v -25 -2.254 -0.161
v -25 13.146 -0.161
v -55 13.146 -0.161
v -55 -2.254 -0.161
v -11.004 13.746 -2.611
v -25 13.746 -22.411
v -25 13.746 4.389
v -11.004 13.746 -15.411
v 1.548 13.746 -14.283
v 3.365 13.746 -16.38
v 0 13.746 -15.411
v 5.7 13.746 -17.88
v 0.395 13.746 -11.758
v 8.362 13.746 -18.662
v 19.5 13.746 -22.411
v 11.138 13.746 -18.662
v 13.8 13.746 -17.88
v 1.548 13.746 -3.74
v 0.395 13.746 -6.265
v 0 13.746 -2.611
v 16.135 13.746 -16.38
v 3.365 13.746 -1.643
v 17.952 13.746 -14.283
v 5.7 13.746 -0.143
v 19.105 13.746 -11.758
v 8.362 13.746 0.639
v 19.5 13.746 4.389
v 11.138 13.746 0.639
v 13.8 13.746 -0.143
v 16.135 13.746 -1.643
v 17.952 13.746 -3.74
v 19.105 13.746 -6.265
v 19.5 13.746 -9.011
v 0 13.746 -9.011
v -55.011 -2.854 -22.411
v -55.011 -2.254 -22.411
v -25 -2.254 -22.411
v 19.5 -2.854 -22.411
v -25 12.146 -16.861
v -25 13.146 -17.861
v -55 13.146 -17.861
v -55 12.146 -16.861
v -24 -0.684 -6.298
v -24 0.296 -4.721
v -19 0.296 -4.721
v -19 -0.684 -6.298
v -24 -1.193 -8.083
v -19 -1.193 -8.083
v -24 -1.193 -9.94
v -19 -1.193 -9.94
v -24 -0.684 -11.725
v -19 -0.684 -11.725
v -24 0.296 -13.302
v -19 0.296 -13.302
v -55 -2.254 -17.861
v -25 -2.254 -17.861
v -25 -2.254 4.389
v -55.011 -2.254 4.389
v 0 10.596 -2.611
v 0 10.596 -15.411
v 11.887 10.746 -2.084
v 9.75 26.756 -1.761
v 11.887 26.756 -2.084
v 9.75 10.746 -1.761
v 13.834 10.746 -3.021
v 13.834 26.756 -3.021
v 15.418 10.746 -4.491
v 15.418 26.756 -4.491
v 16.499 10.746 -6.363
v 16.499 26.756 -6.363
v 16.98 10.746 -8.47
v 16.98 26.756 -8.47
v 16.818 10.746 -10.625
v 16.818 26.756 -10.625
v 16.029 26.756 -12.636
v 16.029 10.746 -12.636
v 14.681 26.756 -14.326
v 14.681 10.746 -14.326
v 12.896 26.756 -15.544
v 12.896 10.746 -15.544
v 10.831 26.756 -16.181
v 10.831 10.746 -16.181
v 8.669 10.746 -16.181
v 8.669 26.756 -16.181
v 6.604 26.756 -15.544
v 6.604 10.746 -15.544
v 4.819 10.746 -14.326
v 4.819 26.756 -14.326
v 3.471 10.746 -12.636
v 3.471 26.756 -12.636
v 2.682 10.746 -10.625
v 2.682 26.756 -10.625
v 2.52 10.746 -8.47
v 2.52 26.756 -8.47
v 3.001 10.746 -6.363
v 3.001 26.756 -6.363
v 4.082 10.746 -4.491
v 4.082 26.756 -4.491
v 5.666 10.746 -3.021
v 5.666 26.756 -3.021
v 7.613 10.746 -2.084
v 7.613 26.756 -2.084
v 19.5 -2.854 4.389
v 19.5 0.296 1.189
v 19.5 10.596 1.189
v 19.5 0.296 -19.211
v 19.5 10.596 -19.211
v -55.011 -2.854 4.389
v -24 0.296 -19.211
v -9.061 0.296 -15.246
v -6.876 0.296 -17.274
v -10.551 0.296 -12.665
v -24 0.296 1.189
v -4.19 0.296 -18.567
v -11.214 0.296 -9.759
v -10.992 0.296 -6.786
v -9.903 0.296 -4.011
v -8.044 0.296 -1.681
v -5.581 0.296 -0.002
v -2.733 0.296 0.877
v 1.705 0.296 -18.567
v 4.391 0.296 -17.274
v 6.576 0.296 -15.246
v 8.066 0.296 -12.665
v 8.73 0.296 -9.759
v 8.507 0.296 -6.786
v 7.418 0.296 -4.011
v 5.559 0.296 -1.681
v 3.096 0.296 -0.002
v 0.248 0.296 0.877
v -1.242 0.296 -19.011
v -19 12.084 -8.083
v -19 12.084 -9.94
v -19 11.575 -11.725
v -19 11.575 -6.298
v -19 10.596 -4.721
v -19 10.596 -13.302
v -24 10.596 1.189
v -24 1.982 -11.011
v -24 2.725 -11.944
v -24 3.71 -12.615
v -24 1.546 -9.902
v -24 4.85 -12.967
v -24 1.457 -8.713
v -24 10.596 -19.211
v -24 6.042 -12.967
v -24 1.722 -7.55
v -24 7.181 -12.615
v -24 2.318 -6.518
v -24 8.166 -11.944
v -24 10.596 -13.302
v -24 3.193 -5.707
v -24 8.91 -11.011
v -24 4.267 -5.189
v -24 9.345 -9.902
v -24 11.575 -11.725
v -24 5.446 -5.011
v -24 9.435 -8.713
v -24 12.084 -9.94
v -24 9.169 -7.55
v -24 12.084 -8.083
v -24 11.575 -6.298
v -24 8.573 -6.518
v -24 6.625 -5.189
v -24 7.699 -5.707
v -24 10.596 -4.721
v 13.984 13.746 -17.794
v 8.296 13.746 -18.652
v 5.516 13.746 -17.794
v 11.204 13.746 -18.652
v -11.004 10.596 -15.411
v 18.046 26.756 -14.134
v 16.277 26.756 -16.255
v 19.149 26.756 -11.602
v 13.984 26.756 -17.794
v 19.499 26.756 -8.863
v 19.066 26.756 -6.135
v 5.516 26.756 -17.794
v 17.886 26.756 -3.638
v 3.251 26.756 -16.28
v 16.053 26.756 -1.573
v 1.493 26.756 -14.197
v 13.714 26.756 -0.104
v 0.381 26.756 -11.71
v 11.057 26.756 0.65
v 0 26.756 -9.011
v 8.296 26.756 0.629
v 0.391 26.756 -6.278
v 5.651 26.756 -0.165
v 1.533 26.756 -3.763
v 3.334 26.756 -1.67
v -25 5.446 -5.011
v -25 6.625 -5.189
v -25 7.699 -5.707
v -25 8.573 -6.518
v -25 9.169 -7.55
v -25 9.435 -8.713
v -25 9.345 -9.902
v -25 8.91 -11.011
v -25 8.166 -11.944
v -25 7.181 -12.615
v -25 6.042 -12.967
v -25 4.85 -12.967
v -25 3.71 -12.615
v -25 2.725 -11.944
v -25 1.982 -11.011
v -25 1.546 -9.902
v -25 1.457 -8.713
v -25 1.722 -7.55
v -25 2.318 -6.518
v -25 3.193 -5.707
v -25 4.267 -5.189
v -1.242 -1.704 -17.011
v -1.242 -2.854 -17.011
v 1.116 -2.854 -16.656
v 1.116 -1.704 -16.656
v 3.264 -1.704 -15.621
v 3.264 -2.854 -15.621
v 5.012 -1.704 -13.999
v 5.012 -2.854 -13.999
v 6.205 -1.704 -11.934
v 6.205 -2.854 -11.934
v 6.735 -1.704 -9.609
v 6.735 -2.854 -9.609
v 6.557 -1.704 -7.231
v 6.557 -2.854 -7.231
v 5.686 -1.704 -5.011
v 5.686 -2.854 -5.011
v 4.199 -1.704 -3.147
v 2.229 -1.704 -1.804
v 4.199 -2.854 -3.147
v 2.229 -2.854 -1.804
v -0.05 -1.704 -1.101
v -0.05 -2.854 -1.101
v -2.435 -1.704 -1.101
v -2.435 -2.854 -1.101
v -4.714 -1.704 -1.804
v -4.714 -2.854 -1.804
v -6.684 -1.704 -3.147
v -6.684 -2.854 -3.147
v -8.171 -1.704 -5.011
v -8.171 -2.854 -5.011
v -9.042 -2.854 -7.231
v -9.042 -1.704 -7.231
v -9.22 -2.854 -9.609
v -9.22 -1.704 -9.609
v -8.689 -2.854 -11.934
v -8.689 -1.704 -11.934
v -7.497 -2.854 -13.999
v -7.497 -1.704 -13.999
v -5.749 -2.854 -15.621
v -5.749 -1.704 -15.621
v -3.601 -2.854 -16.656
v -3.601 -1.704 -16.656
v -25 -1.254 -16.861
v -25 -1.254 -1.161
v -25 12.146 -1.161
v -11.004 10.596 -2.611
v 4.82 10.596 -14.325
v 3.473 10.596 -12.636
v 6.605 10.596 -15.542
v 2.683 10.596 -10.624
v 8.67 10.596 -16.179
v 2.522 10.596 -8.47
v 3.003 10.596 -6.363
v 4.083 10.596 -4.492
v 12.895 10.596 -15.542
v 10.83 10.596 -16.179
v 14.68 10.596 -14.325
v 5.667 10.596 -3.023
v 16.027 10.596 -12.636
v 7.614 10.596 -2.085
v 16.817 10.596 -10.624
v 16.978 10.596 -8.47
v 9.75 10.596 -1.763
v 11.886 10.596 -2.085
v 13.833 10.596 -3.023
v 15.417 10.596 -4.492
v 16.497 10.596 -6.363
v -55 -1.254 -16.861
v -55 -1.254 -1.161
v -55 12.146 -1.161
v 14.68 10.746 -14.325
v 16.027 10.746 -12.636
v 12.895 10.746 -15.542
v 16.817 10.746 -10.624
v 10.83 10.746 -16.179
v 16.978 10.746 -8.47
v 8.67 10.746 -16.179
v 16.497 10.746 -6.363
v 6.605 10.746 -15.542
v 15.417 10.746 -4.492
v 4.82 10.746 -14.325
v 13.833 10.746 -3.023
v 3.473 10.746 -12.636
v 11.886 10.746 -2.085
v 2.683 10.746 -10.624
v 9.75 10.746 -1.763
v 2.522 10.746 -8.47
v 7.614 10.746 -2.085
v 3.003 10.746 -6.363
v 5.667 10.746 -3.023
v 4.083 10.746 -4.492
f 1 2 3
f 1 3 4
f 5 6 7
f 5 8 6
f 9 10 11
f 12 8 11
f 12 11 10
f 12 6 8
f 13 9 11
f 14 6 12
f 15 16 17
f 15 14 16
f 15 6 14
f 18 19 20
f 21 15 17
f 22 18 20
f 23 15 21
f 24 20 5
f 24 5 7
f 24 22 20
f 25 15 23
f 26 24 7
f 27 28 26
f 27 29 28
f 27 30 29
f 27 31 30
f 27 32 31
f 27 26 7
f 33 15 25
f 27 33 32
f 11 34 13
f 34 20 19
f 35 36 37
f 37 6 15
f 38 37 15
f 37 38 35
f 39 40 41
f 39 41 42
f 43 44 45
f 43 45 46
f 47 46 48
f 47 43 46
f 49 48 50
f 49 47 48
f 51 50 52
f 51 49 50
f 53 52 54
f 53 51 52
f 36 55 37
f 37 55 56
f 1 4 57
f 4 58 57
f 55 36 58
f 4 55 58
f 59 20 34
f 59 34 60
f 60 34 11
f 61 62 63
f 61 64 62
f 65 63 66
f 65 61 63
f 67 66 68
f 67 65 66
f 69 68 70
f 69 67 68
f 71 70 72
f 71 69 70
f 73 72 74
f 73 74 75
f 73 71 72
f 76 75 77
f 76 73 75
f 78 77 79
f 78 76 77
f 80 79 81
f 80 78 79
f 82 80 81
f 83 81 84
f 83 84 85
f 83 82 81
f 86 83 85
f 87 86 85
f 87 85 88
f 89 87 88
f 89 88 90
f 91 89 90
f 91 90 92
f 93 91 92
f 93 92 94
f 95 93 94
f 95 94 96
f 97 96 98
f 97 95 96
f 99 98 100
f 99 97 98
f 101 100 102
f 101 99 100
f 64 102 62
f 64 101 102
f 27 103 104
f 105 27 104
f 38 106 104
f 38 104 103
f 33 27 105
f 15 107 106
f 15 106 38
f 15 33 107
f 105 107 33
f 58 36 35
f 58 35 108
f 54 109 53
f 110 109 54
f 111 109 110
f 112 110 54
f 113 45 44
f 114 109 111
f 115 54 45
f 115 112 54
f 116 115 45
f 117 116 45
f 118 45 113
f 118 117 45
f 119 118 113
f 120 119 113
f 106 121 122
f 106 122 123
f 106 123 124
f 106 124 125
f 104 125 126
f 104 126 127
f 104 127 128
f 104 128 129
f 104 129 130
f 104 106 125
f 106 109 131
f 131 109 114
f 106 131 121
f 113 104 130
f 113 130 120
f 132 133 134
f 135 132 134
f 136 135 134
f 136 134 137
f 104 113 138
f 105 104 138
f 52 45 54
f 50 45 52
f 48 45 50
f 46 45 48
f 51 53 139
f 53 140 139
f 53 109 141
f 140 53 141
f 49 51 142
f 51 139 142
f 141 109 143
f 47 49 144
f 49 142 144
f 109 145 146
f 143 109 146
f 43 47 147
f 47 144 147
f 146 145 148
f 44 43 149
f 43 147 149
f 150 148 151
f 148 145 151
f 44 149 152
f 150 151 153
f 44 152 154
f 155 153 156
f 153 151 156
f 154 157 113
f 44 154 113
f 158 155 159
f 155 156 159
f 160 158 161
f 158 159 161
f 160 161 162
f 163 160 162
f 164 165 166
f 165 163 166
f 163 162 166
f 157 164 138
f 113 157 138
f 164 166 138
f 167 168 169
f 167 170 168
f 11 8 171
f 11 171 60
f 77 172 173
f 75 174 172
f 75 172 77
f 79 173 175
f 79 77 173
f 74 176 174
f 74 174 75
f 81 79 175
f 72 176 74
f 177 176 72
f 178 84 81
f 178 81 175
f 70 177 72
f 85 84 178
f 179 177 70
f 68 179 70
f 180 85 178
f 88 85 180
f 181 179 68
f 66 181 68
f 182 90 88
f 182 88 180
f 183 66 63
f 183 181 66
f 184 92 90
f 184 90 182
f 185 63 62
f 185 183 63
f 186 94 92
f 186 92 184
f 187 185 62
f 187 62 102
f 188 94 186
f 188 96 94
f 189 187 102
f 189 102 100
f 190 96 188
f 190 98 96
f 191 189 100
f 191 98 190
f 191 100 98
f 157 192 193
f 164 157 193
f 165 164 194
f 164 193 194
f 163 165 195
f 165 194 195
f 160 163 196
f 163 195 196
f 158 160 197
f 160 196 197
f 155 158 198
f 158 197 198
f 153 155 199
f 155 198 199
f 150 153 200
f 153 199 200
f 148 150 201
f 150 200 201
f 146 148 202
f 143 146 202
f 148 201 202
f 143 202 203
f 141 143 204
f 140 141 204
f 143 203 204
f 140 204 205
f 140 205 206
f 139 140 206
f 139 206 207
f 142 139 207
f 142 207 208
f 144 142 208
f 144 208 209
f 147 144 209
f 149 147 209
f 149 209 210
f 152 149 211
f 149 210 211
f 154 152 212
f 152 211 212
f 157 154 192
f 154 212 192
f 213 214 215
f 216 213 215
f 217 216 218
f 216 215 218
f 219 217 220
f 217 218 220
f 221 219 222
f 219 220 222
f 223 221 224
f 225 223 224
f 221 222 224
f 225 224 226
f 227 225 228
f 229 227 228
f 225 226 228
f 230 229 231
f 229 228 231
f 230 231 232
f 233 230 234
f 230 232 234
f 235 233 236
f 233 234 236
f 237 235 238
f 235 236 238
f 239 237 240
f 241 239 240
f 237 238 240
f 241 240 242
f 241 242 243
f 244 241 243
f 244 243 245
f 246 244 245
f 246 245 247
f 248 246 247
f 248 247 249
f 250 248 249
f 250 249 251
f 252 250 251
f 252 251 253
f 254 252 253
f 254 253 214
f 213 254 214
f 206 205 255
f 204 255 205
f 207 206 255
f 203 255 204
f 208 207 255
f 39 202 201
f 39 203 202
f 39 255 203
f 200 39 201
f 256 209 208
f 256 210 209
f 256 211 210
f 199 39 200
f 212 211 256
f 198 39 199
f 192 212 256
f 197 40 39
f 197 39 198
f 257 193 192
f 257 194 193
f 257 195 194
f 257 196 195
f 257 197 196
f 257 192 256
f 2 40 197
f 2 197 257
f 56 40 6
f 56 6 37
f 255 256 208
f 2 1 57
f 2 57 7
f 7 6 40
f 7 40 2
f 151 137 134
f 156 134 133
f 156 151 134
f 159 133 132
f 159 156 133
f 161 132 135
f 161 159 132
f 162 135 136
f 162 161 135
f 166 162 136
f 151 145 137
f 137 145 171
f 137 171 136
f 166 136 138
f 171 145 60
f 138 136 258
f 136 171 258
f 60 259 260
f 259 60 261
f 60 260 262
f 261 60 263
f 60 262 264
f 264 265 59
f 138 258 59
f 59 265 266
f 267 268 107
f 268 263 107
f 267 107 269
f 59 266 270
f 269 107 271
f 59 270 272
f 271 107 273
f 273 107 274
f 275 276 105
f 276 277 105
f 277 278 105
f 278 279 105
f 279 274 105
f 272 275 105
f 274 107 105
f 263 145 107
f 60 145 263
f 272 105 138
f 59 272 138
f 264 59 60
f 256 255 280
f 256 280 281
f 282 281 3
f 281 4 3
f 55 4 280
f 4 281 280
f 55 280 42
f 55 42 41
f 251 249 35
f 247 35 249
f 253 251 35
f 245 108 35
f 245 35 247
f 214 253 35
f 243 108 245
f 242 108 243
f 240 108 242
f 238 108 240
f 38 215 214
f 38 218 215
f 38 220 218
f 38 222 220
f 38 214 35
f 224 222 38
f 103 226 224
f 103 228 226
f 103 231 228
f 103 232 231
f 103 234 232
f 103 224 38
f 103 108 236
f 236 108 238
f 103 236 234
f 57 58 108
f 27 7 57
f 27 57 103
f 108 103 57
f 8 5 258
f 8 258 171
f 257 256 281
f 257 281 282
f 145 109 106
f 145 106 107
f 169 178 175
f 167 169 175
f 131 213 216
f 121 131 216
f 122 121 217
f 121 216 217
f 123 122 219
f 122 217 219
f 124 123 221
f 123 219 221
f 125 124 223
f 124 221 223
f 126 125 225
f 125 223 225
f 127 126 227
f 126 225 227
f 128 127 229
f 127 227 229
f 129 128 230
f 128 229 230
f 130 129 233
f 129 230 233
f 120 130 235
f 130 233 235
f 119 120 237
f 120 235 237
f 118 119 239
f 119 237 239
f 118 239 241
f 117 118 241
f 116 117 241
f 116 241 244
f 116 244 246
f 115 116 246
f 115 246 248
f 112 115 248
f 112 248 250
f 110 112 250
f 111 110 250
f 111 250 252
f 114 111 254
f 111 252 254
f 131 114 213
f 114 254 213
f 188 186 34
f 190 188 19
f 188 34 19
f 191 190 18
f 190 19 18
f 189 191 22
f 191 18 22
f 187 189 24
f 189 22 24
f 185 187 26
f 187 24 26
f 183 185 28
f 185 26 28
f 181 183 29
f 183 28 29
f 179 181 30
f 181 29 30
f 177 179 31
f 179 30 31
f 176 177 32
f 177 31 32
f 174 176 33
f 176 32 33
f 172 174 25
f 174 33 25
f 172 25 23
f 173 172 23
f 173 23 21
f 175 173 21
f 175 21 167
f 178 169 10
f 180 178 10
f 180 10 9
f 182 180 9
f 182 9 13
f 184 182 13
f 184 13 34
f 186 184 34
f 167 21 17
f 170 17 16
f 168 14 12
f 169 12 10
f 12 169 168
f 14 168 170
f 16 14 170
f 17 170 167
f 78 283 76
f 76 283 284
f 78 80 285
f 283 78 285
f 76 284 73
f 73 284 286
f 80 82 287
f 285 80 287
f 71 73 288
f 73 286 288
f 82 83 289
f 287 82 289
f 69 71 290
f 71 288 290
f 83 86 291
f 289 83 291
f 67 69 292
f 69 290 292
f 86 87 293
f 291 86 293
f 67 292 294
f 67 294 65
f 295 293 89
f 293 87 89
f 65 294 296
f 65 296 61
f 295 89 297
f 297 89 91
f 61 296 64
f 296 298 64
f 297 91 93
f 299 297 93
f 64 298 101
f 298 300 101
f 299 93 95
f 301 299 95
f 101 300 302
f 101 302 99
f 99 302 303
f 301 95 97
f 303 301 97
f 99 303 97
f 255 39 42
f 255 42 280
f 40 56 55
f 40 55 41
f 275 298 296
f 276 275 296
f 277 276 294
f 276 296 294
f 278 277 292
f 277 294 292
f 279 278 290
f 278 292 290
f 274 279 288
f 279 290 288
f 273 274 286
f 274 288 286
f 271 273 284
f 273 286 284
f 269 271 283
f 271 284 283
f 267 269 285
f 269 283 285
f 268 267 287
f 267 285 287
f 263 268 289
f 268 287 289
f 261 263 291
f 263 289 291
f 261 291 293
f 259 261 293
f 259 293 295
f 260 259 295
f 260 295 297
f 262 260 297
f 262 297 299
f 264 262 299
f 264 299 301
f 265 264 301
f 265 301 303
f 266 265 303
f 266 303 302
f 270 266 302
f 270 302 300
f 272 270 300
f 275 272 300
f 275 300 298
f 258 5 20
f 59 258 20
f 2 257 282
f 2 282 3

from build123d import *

# Parameters (mm, degrees)
SKETCH2_W            = 26.8
SKETCH2_H            = 16.6
SKETCH2_W_2          = 20.8
SKETCH2_H_2          = 10.6
BOSS_EXTRUDE3_DEPTH  = 19.5
SKETCH8_R            = 9.75
SKETCH8_R_2          = 7.25
BOSS_EXTRUDE5_DEPTH  = 13.010482488
CUT_EXTRUDE1_START   = -5
SKETCH9_R            = 7.25
CUT_EXTRUDE1_DEPTH   = 5
SKETCH11_W           = 20.8
SKETCH11_H           = 10.6
SKETCH11_W_2         = 20.4
SKETCH11_H_2         = 10.3
BOSS_EXTRUDE7_DEPTH  = 19.5
SKETCH12_R           = 7.248274147
CUT_EXTRUDE3_DEPTH   = 4
SKETCH14_W           = 26.8
SKETCH14_H           = 16.6
SKETCH14_W_2         = 20.4
SKETCH14_H_2         = 10.3
BOSS_EXTRUDE8_DEPTH  = 24
SKETCH15_R           = 8
CUT_EXTRUDE5_DEPTH   = 5
SKETCH16_W           = 11.004107939
SKETCH16_H           = 12.8
CUT_EXTRUDE6_DEPTH   = 5
CHAMFER4_SIZE        = 2
SKETCH17_W           = 26.8
SKETCH17_H           = 16.6
BOSS_EXTRUDE9_DEPTH  = 1
SKETCH18_R           = 4
CUT_EXTRUDE7_DEPTH   = 1
BOSS_EXTRUDE11_DEPTH = 30
SKETCH20_W           = 30.011261772
SKETCH20_H           = 26.8
BOSS_EXTRUDE12_DEPTH = 0.6
SKETCH23_R           = 6.70324332
CUT_EXTRUDE9_DEPTH   = 5
SKETCH25_W           = 20.840121468
SKETCH25_H           = 2.448199345
CUT_EXTRUDE10_DEPTH  = 13.01


with BuildPart() as part:
    # Sketch2 → Boss-Extrude3 (new body)
    with BuildSketch(Plane(origin=(0, 0, 0), x_dir=(0, 0, -1), z_dir=(1, 0, 0))):
        with Locations((9.011494253, 5.445783842)):
            Rectangle(SKETCH2_W, SKETCH2_H)
        with Locations((9.011494253, 5.445783842)):
            Rectangle(SKETCH2_W_2, SKETCH2_H_2, mode=Mode.SUBTRACT)
    extrude(amount=BOSS_EXTRUDE3_DEPTH)

    # Sketch8 → Boss-Extrude5 (add)
    with BuildSketch(Plane(origin=(0, 13.745783842, 0), x_dir=(1, 0, 0), z_dir=(0, 1, 0))):
        with Locations(Location((9.75, 9.011494253, 0), (0, 0, 180))):
            Circle(SKETCH8_R)
        with Locations(Location((9.75, 9.011494253, 0), (0, 0, 270))):
            Circle(SKETCH8_R_2, mode=Mode.SUBTRACT)
    extrude(amount=BOSS_EXTRUDE5_DEPTH)

    # Sketch9 → Cut-Extrude1 (cut)
    with BuildSketch(Plane(origin=(0, 13.745783842, 0), x_dir=(1, 0, 0), z_dir=(0, 1, 0)).offset(CUT_EXTRUDE1_START)):
        with Locations(Location((9.75, 9.011494253, 0), (0, 0, 270))):
            Circle(SKETCH9_R)
    extrude(amount=CUT_EXTRUDE1_DEPTH, mode=Mode.SUBTRACT)

    # Sketch11 → Boss-Extrude7 (add)
    with BuildSketch(Plane.ZY):
        with Locations((-9.011494253, 5.445783842)):
            Rectangle(SKETCH11_W, SKETCH11_H)
        with Locations((-9.011494253, 5.445783842)):
            Rectangle(SKETCH11_W_2, SKETCH11_H_2, mode=Mode.SUBTRACT)
    extrude(amount=-BOSS_EXTRUDE7_DEPTH)

    # Sketch12 → Cut-Extrude3 (cut)
    with BuildSketch(Plane(origin=(0, 13.745783842, 0), x_dir=(1, 0, 0), z_dir=(0, 1, 0))):
        with Locations(Location((9.75, 9.011494253, 0), (0, 0, 270))):
            Circle(SKETCH12_R)
    extrude(amount=-CUT_EXTRUDE3_DEPTH, mode=Mode.SUBTRACT)

    # Sketch14 → Boss-Extrude8 (add)
    with BuildSketch(Plane.ZY):
        with Locations((-9.011494253, 5.445783842)):
            Rectangle(SKETCH14_W, SKETCH14_H)
        with Locations((-9.011494253, 5.445783842)):
            Rectangle(SKETCH14_W_2, SKETCH14_H_2, mode=Mode.SUBTRACT)
    extrude(amount=BOSS_EXTRUDE8_DEPTH)

    # Sketch15 → Cut-Extrude5 (cut)
    with BuildSketch(Plane.XZ.offset(2.854216158)):
        with Locations(Location((-1.242459593, -9.011494253, 0), (0, 0, 270))):
            Circle(SKETCH15_R)
    extrude(amount=-CUT_EXTRUDE5_DEPTH, mode=Mode.SUBTRACT)

    # Sketch16 → Cut-Extrude6 (cut)
    with BuildSketch(Plane(origin=(0, 13.745783842, 0), x_dir=(1, 0, 0), z_dir=(0, 1, 0))):
        with Locations((-5.50205397, 9.011494253)):
            Rectangle(SKETCH16_W, SKETCH16_H)
    extrude(amount=-CUT_EXTRUDE6_DEPTH, mode=Mode.SUBTRACT)

    # Chamfer4
    chamfer4_edges = [part.edges().sort_by_distance(p)[0] for p in [
        (-1.242459593, 0.295783842, -1.011494253),
    ]]
    chamfer(chamfer4_edges, length=CHAMFER4_SIZE)

    # Sketch17 → Boss-Extrude9 (add)
    with BuildSketch(Plane.ZY.offset(24)):
        with Locations((-9.011494253, 5.445783842)):
            Rectangle(SKETCH17_W, SKETCH17_H)
    extrude(amount=BOSS_EXTRUDE9_DEPTH)

    # Sketch18 → Cut-Extrude7 (cut)
    with BuildSketch(Plane.ZY.offset(25)):
        with Locations((-9.011494253, 5.445783842)):
            Circle(SKETCH18_R)
    extrude(amount=-CUT_EXTRUDE7_DEPTH, mode=Mode.SUBTRACT)

    # Sketch19 → Boss-Extrude11 (add)
    with BuildSketch(Plane.ZY.offset(25)):
        Polygon((-0.161494253, 13.145783842), (-0.161494253, -2.254216158), (-17.861494253, -2.254216158), (-17.861494253, 13.145783842), (-16.861494253, 12.145783842), (-16.861494253, -1.254216158), (-1.161494253, -1.254216158), (-1.161494253, 12.145783842), align=None)
    extrude(amount=BOSS_EXTRUDE11_DEPTH)

    # Sketch20 → Boss-Extrude12 (add)
    with BuildSketch(Plane.XZ.offset(2.254216158)):
        with Locations((-40.005630886, -9.011494253)):
            Rectangle(SKETCH20_W, SKETCH20_H)
    extrude(amount=BOSS_EXTRUDE12_DEPTH)

    # Sketch23 → Cut-Extrude9 (cut)
    with BuildSketch(Plane(origin=(-24, 0, 0), x_dir=(0, 0, -1), z_dir=(1, 0, 0))):
        with Locations((9.011494253, 5.445783842)):
            Circle(SKETCH23_R)
    extrude(amount=CUT_EXTRUDE9_DEPTH, mode=Mode.SUBTRACT)

    # Sketch25 → Cut-Extrude10 (cut)
    with BuildSketch(Plane(origin=(0, 26.756266329, 0), x_dir=(1, 0, 0), z_dir=(0, 1, 0))):
        with Locations((10.420060734, 19.018301842)):
            Rectangle(SKETCH25_W, SKETCH25_H)
    extrude(amount=-CUT_EXTRUDE10_DEPTH, mode=Mode.SUBTRACT)


solid = part.part
